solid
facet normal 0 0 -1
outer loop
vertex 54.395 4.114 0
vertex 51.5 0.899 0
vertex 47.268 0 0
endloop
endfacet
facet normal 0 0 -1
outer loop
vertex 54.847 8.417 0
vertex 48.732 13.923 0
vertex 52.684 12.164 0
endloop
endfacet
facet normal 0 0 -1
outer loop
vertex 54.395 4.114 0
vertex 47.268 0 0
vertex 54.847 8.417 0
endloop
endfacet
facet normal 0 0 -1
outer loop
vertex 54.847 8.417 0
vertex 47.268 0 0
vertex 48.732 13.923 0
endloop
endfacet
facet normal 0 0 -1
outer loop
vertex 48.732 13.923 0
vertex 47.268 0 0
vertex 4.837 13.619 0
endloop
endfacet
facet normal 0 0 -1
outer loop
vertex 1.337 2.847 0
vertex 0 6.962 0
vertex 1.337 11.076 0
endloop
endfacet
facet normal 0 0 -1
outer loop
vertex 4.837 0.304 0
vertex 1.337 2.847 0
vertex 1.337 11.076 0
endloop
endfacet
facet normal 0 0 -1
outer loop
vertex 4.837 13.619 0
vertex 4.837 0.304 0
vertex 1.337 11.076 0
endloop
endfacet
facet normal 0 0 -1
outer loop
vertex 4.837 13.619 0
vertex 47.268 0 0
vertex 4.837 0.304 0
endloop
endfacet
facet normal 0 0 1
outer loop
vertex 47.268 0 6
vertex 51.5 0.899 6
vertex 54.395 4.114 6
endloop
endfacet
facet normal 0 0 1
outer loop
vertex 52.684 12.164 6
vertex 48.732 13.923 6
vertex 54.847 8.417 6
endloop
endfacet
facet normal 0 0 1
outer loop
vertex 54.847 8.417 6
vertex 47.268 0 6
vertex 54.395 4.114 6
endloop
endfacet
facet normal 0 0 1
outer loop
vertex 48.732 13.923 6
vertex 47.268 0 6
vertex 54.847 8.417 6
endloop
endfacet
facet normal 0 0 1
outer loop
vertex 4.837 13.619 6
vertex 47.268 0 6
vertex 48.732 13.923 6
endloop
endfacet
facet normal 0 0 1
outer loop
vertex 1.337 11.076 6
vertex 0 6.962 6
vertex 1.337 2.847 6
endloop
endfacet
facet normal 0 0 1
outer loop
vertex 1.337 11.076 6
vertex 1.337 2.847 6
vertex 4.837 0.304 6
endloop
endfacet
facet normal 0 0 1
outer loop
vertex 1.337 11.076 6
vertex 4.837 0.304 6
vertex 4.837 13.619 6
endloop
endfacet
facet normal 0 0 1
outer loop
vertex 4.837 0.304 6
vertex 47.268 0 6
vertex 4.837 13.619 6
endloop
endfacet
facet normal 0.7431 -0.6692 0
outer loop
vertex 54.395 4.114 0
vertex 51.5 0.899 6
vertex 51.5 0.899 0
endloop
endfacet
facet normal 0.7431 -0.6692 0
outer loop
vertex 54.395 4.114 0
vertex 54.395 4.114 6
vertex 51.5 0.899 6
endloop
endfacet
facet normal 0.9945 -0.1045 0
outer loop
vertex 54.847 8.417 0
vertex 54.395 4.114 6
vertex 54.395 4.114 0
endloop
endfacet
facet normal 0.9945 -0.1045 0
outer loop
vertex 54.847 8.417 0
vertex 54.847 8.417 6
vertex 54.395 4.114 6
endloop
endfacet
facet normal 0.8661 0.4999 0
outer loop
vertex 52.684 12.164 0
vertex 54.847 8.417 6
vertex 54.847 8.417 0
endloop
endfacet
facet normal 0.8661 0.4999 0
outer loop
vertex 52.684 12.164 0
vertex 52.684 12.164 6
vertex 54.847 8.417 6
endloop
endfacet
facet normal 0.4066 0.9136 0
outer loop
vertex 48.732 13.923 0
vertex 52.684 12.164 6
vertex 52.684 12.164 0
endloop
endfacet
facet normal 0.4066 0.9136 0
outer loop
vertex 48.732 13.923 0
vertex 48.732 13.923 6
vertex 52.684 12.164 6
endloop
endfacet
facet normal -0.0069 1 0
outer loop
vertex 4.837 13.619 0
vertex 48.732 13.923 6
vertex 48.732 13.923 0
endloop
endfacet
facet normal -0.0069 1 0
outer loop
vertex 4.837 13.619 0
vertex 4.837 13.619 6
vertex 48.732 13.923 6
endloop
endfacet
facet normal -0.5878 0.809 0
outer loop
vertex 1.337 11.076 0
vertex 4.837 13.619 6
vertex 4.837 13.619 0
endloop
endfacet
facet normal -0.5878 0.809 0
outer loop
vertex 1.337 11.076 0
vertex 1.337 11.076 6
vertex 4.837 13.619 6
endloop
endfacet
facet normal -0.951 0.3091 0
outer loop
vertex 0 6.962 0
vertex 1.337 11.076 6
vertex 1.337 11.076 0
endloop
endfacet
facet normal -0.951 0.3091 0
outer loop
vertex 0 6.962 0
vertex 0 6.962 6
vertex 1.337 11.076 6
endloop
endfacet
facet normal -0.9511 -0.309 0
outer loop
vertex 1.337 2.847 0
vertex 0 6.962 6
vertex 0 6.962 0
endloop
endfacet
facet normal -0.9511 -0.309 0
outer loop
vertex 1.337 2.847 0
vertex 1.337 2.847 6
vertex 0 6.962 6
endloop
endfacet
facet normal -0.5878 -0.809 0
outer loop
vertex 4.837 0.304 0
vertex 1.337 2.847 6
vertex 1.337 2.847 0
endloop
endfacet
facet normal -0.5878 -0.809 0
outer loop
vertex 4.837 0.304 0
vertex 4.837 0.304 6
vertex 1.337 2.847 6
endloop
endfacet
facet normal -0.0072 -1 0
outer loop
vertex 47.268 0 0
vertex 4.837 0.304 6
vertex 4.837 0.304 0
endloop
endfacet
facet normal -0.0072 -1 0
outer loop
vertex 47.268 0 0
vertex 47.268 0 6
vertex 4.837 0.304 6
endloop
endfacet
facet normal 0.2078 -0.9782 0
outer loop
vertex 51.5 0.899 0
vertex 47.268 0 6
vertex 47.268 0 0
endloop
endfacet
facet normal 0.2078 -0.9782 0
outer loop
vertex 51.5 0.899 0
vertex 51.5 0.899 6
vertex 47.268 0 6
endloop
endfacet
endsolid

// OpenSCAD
$fn = 32;

// ----------------------------------------------------------------------
// Key bar: parallel key, 6 mm thick
// ----------------------------------------------------------------------

// --- parameters (mm) ---
profile_height = 6;       // extrusion height
profile_points = 11;      // points of the closed outline

profile = [[0, 6.962], [1.337, 2.847], [4.837, 0.304], [47.268, 0], [51.5, 0.899], [54.395, 4.114], [54.847, 8.417], [52.684, 12.164], [48.732, 13.923], [4.837, 13.619], [1.337, 11.076]];  // single closed polygon, 11 points, counter clockwise

// --- the one profile operation ---
linear_extrude(height = profile_height) polygon(points = profile);
